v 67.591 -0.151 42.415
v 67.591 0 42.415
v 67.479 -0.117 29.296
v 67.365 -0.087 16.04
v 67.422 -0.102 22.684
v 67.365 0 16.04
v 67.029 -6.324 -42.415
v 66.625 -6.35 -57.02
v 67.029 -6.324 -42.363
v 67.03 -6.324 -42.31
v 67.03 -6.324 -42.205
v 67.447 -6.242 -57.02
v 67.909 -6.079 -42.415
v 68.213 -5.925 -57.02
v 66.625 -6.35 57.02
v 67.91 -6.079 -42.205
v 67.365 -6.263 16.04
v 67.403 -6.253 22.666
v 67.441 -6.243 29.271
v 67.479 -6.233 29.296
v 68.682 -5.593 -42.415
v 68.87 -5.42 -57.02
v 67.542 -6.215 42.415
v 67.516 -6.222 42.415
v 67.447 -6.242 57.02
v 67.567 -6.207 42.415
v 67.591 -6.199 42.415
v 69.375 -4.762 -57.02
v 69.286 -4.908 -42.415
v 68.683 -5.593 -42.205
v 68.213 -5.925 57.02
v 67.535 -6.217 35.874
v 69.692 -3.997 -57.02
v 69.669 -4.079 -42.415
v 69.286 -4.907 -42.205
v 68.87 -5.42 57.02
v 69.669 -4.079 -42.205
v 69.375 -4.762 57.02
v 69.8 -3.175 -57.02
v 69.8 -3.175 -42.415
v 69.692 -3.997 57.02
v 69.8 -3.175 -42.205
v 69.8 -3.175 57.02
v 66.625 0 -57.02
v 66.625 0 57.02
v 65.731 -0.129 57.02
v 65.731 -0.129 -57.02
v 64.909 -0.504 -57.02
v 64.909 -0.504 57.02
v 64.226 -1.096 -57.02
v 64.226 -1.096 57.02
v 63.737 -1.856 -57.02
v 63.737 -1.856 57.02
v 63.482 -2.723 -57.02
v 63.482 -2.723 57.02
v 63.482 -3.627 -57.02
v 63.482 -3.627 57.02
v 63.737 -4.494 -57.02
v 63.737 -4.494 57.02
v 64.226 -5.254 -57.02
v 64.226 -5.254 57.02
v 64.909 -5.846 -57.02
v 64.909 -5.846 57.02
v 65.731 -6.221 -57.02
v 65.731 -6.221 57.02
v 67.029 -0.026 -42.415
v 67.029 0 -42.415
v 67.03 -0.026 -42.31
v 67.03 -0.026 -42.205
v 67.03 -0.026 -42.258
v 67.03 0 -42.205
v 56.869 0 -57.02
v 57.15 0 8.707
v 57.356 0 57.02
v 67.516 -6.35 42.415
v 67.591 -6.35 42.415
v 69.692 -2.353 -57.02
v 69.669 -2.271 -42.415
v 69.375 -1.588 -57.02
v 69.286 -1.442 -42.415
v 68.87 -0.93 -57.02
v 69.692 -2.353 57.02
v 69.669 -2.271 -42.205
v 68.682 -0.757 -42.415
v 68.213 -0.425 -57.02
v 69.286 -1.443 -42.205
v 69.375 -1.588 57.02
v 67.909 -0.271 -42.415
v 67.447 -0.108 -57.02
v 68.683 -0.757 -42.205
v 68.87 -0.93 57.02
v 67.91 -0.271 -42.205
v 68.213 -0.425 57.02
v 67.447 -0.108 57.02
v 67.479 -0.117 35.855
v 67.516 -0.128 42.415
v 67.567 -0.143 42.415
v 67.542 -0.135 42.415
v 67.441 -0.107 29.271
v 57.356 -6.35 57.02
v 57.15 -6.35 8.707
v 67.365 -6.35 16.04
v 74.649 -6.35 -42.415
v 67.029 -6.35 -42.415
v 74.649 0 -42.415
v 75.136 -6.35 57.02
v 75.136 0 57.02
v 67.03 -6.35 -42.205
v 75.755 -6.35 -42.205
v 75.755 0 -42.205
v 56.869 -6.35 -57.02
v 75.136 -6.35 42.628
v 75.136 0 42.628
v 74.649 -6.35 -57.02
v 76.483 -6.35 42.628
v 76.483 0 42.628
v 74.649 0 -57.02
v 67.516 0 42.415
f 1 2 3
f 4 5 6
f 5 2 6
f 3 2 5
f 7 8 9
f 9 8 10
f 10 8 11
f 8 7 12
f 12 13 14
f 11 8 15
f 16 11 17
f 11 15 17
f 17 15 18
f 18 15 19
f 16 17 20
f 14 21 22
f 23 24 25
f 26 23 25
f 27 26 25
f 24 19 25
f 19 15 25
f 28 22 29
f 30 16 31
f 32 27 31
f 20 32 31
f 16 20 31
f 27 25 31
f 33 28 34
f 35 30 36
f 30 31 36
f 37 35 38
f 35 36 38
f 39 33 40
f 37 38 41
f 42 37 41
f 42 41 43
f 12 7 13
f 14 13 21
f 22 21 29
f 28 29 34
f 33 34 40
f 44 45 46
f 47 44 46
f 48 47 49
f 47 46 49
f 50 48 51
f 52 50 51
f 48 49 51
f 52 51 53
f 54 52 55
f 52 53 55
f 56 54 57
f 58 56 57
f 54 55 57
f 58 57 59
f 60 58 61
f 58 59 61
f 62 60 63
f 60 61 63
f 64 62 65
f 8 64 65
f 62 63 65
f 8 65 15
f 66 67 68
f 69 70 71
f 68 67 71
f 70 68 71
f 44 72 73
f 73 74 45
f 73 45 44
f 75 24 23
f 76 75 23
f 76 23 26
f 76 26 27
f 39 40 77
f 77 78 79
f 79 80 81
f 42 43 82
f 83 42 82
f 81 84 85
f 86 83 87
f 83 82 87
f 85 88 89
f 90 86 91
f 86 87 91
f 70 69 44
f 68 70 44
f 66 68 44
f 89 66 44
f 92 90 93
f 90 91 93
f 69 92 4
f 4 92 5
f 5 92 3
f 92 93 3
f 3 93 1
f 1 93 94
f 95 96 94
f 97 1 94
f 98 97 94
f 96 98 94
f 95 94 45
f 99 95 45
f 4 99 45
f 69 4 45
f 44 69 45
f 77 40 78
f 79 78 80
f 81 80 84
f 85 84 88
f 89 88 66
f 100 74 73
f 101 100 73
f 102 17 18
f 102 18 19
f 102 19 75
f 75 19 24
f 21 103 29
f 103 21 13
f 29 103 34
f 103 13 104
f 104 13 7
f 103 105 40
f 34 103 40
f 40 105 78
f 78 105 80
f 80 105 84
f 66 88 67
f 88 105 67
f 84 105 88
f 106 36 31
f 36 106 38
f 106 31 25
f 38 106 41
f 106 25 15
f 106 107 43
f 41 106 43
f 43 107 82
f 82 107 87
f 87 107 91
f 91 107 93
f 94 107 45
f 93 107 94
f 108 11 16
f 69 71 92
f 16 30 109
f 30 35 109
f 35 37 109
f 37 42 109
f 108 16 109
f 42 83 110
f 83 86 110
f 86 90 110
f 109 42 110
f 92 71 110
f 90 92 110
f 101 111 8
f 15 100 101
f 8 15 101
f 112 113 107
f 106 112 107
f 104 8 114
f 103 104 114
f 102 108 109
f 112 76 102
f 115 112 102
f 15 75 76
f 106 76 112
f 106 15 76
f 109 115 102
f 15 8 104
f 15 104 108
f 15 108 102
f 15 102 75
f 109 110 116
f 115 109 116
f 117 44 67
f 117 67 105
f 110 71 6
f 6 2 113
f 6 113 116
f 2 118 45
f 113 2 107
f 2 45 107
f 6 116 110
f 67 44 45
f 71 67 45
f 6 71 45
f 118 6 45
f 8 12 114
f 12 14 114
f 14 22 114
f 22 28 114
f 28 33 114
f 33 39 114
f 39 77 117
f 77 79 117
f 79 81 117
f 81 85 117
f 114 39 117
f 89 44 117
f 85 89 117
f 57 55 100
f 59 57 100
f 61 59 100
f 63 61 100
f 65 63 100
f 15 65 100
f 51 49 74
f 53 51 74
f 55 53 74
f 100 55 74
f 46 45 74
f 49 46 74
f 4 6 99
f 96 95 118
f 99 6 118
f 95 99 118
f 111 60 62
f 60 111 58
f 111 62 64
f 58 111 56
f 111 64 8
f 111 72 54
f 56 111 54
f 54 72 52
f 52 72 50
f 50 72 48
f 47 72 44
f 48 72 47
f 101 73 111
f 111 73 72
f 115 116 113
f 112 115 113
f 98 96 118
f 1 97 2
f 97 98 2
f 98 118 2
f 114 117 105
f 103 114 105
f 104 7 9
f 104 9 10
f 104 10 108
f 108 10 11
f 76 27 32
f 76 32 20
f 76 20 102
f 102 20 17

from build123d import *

# Parameters (mm, degrees)
F3_DEPTH = 6.35
F4_DEPTH = 6.35
F6_DEPTH = 114.041717


with BuildPart() as f3:
    # F1 (on face) → F3 (new body)
    with BuildSketch(Plane.XZ):
        Polygon((75.136469, 57.020359), (57.356469, 57.020359), (57.15, 8.707022), (57.15, -57.020359), (74.649112, -57.020359), (74.649112, -42.415359), (67.029112, -42.415359), (67.516469, 42.415359), (75.136469, 42.415359), align=None)
        Polygon((75.136469, 57.020359), (57.356469, 57.020359), (56.869112, -57.020359), (74.649112, -57.020359), (74.649112, -42.415359), (67.029112, -42.415359), (67.516469, 42.415359), (75.136469, 42.415359), align=None)
    extrude(amount=F3_DEPTH)

    # F2 (on face) → F4 (join)
    with BuildSketch(Plane.XZ):
        Polygon((76.483287, 42.627829), (67.593287, 42.627829), (66.864709, -42.205043), (75.754709, -42.205043), align=None)
    extrude(amount=F4_DEPTH)

    # F5 (on face) → F6 (cut, through all)
    with BuildSketch(Plane.XY.offset(57.020359)):
        with BuildLine():
            ThreePointArc((66.625118, -6.35), (68.870182, -5.420064), (69.800118, -3.175))
            ThreePointArc((69.800118, -3.175), (68.870182, -0.929936), (66.625118, 0))
            ThreePointArc((66.625118, 0), (63.450118, -3.175), (66.625118, -6.35))
        make_face()
    extrude(amount=-F6_DEPTH, mode=Mode.SUBTRACT)


solid = f3.part
